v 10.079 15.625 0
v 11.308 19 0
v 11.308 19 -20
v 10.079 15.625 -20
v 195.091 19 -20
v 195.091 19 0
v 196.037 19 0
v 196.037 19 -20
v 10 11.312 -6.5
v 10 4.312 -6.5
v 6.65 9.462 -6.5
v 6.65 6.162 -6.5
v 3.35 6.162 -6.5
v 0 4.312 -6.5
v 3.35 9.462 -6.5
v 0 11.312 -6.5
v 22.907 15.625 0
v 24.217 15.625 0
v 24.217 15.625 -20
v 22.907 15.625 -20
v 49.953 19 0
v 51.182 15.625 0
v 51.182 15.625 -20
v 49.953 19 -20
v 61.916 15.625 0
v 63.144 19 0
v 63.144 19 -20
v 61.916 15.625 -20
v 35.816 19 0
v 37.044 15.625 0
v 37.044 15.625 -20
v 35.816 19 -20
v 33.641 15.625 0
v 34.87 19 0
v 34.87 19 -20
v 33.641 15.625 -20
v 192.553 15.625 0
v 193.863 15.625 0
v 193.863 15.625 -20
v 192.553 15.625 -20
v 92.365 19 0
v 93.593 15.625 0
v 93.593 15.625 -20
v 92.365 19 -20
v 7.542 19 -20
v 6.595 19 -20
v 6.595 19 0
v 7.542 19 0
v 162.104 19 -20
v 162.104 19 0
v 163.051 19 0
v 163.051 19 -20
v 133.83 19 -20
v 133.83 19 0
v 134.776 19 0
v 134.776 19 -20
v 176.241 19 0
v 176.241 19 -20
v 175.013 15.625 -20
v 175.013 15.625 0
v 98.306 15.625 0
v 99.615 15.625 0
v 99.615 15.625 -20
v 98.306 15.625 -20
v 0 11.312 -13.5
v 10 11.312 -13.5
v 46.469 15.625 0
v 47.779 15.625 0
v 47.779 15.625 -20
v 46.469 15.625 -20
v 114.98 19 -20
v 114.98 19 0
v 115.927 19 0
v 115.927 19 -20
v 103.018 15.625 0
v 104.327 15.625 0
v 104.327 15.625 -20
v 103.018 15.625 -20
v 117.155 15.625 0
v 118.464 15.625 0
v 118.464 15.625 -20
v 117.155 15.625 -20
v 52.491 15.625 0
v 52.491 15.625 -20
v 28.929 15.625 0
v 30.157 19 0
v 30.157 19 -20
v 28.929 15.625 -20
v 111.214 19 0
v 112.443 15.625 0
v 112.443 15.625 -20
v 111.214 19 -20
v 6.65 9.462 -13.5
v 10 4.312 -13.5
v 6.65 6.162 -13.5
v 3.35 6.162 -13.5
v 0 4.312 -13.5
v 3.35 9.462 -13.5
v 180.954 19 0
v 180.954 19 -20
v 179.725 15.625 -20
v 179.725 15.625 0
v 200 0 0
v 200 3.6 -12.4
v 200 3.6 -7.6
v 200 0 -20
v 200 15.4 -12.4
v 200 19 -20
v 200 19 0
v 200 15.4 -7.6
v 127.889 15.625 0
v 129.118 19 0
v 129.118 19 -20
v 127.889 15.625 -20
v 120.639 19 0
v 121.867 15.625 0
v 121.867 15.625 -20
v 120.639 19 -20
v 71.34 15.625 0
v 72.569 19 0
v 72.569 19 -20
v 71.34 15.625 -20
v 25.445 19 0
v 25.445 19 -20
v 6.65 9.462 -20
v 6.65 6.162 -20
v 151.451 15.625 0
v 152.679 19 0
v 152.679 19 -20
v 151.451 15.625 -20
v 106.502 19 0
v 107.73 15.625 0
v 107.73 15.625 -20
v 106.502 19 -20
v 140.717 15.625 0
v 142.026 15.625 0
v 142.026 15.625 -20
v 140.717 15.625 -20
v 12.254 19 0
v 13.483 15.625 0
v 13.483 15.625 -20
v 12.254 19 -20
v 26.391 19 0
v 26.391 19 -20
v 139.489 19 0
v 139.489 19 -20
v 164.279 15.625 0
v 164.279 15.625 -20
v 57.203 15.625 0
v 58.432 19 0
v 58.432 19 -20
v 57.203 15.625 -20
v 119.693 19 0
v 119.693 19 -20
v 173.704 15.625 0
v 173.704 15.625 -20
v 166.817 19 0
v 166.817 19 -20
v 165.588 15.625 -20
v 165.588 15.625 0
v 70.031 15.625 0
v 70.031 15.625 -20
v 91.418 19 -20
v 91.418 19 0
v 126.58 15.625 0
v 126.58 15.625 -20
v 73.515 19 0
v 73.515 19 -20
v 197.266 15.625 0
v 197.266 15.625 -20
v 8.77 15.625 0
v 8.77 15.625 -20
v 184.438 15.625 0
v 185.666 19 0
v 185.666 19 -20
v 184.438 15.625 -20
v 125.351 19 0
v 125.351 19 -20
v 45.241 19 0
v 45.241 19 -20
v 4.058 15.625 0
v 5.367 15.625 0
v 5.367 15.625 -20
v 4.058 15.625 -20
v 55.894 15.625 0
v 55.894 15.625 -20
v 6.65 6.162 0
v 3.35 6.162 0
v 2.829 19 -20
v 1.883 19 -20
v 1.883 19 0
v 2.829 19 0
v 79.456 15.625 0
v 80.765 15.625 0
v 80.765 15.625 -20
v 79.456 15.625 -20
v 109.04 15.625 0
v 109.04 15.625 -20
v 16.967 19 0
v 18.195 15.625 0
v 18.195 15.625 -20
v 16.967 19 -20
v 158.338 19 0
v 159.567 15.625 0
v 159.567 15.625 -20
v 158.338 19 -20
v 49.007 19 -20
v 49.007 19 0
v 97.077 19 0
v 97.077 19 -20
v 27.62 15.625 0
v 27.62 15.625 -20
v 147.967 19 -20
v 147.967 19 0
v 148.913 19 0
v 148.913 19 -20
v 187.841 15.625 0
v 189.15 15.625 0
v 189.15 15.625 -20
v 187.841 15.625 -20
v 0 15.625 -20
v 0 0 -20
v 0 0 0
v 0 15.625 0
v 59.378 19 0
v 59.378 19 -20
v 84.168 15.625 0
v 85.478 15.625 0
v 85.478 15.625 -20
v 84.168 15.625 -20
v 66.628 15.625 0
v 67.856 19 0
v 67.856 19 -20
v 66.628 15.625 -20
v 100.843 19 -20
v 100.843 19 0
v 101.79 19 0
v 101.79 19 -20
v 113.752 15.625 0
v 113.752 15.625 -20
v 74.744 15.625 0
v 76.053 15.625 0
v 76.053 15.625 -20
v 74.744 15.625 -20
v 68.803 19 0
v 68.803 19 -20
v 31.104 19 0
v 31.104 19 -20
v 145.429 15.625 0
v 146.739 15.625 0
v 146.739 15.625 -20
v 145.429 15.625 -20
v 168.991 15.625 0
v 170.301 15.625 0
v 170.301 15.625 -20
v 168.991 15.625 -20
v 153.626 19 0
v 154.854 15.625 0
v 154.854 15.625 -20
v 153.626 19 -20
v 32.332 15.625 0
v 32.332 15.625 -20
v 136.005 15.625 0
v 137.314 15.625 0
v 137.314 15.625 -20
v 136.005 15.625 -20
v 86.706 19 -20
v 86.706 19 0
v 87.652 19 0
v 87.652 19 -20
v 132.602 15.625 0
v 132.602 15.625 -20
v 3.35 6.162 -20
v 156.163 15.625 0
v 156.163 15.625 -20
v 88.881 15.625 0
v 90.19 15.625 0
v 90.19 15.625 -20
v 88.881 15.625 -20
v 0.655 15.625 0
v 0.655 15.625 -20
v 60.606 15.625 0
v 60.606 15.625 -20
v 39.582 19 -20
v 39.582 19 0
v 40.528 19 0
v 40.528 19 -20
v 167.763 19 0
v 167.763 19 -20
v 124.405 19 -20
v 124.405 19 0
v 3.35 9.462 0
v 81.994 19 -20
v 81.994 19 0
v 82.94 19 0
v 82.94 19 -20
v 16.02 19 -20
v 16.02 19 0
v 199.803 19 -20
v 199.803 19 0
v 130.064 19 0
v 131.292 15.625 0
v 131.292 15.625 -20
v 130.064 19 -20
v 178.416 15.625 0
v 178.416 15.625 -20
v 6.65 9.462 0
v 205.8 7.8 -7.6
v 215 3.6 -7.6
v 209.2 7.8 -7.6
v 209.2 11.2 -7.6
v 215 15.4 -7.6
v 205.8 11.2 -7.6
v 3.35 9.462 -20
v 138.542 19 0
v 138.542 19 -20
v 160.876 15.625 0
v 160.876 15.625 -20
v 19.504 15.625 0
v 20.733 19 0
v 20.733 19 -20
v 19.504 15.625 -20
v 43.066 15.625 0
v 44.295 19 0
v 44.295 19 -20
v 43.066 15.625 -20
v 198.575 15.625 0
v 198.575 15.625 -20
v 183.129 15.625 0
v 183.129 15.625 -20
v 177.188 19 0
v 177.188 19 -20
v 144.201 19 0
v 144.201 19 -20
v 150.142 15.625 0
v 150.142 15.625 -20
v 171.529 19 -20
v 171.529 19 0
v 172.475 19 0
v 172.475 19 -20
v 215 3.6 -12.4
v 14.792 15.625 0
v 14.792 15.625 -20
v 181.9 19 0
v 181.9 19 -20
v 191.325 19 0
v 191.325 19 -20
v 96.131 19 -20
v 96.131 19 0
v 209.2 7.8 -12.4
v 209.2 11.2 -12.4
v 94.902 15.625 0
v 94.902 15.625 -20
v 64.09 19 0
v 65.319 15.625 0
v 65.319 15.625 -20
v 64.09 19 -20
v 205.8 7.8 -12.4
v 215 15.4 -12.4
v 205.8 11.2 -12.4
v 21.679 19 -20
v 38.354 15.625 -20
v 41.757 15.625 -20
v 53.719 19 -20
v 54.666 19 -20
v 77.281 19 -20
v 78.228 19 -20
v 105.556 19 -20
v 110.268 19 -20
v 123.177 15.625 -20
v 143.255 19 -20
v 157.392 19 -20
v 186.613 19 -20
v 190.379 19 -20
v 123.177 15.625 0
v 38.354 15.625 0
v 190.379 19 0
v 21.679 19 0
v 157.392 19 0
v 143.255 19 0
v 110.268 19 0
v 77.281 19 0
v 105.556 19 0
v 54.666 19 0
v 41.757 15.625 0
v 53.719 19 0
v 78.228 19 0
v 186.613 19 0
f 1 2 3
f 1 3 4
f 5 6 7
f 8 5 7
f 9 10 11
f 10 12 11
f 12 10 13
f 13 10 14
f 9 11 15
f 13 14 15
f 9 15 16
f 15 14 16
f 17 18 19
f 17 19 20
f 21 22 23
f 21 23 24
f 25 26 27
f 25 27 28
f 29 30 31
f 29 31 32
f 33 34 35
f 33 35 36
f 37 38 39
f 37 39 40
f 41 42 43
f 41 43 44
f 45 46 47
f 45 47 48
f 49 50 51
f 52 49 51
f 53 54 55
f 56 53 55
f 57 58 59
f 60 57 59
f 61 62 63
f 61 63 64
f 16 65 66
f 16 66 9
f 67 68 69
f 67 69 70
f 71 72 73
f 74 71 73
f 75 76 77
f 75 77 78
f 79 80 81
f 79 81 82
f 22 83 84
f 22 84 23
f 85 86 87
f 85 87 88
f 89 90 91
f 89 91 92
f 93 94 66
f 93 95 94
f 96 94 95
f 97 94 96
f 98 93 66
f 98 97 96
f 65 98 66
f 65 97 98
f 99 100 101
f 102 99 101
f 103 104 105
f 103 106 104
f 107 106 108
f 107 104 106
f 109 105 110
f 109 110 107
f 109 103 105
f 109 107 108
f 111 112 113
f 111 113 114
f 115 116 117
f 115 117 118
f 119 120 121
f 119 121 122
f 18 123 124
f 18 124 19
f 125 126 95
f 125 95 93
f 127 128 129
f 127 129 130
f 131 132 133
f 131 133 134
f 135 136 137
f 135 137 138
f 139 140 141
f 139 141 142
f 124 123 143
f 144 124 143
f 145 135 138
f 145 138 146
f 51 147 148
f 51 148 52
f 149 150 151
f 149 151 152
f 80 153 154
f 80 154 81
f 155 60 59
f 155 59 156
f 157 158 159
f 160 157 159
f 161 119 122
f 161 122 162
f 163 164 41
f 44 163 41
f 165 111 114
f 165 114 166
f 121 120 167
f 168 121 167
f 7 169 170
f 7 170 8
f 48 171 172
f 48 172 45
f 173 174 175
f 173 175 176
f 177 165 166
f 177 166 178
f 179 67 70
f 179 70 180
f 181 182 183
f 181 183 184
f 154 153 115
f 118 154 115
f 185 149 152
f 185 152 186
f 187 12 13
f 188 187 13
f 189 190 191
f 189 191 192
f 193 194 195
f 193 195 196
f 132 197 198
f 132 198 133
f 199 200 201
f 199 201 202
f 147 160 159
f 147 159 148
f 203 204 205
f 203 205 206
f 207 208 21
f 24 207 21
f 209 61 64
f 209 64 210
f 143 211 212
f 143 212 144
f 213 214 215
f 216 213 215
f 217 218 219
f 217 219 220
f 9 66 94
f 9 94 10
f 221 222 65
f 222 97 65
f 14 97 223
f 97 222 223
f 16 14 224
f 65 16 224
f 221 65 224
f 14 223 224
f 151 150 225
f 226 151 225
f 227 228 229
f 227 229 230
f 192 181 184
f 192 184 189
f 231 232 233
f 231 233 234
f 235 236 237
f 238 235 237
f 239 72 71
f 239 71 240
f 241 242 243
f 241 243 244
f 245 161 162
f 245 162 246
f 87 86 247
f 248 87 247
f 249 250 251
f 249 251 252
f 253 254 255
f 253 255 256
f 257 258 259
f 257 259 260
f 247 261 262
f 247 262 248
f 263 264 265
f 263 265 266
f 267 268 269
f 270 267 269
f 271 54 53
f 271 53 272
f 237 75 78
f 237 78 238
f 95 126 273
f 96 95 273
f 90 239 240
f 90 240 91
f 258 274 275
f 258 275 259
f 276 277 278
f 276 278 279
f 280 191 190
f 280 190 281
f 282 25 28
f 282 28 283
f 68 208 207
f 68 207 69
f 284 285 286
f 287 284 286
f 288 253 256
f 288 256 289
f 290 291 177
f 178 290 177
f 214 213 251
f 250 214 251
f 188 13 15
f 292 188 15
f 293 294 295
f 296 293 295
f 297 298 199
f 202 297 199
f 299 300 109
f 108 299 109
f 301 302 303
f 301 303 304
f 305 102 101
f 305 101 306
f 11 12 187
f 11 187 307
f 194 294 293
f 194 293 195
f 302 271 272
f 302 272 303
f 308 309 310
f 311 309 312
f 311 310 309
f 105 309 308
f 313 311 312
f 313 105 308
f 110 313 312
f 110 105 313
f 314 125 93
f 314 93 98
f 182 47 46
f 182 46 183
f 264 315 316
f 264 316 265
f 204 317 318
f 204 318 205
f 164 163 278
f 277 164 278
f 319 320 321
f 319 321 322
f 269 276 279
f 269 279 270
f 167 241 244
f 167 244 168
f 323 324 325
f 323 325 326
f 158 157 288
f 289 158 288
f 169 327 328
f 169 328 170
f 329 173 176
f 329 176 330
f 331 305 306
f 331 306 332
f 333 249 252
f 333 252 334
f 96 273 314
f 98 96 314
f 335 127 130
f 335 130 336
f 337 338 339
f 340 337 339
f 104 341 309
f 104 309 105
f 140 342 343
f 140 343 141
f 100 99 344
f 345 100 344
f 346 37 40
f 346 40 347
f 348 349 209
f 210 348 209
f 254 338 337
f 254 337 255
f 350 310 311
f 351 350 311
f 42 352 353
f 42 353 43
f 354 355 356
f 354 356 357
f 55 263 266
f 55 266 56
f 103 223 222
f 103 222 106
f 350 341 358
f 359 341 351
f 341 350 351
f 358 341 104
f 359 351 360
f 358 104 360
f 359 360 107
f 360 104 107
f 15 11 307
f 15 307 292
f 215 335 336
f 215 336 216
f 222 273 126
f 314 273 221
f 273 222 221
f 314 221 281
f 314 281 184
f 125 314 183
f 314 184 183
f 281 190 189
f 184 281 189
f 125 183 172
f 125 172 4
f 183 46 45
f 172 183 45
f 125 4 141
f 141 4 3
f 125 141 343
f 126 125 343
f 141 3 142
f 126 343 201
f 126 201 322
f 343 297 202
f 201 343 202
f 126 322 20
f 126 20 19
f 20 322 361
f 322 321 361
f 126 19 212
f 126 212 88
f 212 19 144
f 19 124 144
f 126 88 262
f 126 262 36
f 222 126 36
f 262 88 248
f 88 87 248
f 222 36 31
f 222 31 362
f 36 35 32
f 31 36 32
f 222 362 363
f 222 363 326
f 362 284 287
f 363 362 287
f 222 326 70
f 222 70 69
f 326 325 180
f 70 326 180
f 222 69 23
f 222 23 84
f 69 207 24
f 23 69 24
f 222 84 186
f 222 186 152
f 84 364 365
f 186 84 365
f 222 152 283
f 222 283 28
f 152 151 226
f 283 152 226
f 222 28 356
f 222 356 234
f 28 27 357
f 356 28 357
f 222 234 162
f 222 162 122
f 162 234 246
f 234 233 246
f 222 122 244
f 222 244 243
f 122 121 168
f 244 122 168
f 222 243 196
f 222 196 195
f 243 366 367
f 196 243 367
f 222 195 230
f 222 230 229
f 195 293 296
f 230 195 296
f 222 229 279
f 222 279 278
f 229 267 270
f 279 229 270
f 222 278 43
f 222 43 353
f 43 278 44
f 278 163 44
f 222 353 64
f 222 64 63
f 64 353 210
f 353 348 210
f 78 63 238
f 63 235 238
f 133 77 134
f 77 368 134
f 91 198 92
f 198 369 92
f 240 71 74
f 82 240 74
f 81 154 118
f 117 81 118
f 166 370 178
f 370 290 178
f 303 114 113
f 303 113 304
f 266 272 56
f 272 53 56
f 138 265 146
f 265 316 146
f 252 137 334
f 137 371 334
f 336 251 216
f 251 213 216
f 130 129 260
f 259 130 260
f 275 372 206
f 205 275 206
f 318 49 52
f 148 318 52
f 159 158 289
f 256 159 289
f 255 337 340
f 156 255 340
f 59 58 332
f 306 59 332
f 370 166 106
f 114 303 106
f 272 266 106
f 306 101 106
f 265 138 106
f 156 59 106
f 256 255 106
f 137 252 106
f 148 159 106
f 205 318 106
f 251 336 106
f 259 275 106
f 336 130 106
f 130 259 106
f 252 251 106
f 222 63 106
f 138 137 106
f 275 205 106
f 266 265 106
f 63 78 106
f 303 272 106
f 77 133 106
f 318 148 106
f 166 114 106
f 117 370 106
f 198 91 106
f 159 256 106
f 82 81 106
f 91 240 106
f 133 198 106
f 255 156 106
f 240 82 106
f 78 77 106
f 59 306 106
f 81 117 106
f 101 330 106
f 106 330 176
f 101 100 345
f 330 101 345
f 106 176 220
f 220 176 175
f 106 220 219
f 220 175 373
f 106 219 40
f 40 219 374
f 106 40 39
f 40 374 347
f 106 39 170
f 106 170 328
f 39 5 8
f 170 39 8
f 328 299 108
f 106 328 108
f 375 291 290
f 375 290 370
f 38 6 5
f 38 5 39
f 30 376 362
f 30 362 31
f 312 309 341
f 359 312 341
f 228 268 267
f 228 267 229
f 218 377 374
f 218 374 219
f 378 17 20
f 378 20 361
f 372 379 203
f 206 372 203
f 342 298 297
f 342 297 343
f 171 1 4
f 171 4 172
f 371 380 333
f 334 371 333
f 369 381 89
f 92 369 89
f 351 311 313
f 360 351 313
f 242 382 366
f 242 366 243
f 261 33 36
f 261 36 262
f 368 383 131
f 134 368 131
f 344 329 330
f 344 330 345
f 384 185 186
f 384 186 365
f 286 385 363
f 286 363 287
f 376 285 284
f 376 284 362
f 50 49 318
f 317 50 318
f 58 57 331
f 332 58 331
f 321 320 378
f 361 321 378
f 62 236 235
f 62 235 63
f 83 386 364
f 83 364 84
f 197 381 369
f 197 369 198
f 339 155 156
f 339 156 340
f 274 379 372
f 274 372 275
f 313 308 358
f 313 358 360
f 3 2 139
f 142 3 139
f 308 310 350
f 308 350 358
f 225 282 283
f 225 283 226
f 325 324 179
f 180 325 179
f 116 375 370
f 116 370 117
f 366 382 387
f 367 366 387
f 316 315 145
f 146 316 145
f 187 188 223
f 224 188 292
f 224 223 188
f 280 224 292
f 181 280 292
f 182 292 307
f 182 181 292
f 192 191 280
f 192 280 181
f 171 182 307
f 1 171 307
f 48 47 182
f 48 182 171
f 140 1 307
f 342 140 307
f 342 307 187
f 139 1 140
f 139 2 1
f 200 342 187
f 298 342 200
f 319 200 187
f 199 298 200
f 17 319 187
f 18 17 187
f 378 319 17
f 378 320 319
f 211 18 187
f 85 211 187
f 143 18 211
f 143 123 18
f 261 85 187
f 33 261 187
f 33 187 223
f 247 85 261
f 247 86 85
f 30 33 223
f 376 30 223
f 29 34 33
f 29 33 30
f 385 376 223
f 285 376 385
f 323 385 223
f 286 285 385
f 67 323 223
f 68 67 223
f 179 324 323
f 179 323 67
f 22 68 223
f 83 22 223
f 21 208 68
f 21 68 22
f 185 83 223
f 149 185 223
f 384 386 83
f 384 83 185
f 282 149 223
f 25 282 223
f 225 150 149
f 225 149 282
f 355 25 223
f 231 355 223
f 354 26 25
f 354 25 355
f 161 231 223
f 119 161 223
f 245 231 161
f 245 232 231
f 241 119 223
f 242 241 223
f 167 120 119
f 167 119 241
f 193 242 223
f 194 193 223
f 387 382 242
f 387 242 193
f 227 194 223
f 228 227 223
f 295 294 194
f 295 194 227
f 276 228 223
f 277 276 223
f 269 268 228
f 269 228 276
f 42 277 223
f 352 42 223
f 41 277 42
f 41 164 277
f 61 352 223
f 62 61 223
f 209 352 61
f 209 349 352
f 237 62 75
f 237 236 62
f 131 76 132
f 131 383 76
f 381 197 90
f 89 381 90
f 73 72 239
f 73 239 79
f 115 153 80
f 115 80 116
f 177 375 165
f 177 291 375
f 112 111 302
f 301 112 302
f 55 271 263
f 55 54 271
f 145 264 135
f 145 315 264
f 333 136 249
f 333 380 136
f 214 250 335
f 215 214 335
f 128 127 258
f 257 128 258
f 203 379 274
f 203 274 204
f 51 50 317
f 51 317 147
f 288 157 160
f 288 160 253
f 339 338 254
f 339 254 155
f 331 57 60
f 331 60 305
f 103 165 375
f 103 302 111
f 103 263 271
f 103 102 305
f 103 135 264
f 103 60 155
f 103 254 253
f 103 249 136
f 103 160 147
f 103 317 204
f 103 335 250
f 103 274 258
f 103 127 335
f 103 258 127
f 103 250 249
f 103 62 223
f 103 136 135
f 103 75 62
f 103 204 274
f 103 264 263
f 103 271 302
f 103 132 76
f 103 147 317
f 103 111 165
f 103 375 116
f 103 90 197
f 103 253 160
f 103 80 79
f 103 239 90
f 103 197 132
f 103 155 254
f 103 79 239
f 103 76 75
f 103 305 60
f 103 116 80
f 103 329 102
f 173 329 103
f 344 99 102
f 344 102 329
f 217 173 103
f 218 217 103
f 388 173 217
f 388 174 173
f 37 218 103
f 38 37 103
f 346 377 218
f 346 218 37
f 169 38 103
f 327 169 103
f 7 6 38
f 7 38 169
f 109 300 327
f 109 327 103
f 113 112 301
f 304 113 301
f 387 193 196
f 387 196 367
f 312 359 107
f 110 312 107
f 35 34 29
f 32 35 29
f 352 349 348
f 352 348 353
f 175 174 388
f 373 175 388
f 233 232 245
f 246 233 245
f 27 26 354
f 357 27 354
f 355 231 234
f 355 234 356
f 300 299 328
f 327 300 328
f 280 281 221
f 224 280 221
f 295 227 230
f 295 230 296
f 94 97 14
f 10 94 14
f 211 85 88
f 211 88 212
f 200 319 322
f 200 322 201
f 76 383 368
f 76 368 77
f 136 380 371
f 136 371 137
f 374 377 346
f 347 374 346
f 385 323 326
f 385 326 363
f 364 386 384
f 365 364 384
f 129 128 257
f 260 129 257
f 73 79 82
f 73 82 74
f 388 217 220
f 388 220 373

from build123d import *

# Parameters (mm, degrees)
BLANKSKE_W          = 200
BLANKSKE_H          = 19
BLANK_DEPTH         = 20
TOOTHCUTSIM_DEPTH   = 202.893536301
TEETHCUTS_COUNT     = 43
TEETHCUTS_PITCH     = 4.712388975
SKETCH1_W           = 4.8
SKETCH1_H           = 19
BOSS_EXTRUDE1_DEPTH = 15
SKETCH2_W           = 15
SKETCH2_H           = 3.6
SKETCH2_W_2         = 3.4
SKETCH2_H_2         = 3.4
CUT_EXTRUDE1_DEPTH  = 4.8
SKETCH3_W           = 7
SKETCH3_H           = 7
CUT_EXTRUDE3_DEPTH  = 10
SKETCH4_W           = 3.3
SKETCH4_H           = 3.3
CUT_EXTRUDE4_DEPTH  = 25


with BuildPart() as part:
    # BlankSke → Blank (new body)
    with BuildSketch(Plane.XY):
        with Locations((100, 9.5)):
            Rectangle(BLANKSKE_W, BLANKSKE_H)
    extrude(amount=-BLANK_DEPTH)

    # TooCutSkeSim → ToothCutSim (cut, through all)
    with BuildSketch(Plane.XY):
        Polygon((0.654653055, 15.625), (-0.654653055, 15.625), (-1.892297439, 19.0254), (1.892297439, 19.0254), align=None)
    toothcutsim = extrude(amount=-TOOTHCUTSIM_DEPTH, mode=Mode.SUBTRACT)

    # TeethCuts: ToothCutSim ×43
    with Locations(*[(i * TEETHCUTS_PITCH, 0, 0) for i in range(1, TEETHCUTS_COUNT)]):
        add(toothcutsim, mode=Mode.SUBTRACT)

    # Sketch1 → Boss-Extrude1 (add)
    with BuildSketch(Plane(origin=(200, 0, 0), x_dir=(0, 0, -1), z_dir=(1, 0, 0))):
        with Locations((10, 9.5)):
            Rectangle(SKETCH1_W, SKETCH1_H)
    extrude(amount=BOSS_EXTRUDE1_DEPTH)

    # Sketch2 → Cut-Extrude1 (cut)
    with BuildSketch(Plane(origin=(0, 0, -12.4), x_dir=(-1, 0, 0), z_dir=(0, 0, -1))):
        with Locations((-207.5, 17.2)):
            Rectangle(SKETCH2_W, SKETCH2_H)
        with Locations((-207.5, 1.8)):
            Rectangle(SKETCH2_W, SKETCH2_H)
        with Locations((-207.5, 9.5)):
            Rectangle(SKETCH2_W_2, SKETCH2_H_2)
    extrude(amount=-CUT_EXTRUDE1_DEPTH, mode=Mode.SUBTRACT)

    # Sketch3 → Cut-Extrude3 (cut)
    with BuildSketch(Plane.ZY):
        with Locations((-10, 7.8125)):
            Rectangle(SKETCH3_W, SKETCH3_H)
    extrude(amount=-CUT_EXTRUDE3_DEPTH, mode=Mode.SUBTRACT)

    # Sketch4 → Cut-Extrude4 (cut)
    with BuildSketch(Plane(origin=(0, 0, -20), x_dir=(-1, 0, 0), z_dir=(0, 0, -1))):
        with Locations((-5, 7.8125)):
            Rectangle(SKETCH4_W, SKETCH4_H)
    extrude(amount=-CUT_EXTRUDE4_DEPTH, mode=Mode.SUBTRACT)


solid = part.part
